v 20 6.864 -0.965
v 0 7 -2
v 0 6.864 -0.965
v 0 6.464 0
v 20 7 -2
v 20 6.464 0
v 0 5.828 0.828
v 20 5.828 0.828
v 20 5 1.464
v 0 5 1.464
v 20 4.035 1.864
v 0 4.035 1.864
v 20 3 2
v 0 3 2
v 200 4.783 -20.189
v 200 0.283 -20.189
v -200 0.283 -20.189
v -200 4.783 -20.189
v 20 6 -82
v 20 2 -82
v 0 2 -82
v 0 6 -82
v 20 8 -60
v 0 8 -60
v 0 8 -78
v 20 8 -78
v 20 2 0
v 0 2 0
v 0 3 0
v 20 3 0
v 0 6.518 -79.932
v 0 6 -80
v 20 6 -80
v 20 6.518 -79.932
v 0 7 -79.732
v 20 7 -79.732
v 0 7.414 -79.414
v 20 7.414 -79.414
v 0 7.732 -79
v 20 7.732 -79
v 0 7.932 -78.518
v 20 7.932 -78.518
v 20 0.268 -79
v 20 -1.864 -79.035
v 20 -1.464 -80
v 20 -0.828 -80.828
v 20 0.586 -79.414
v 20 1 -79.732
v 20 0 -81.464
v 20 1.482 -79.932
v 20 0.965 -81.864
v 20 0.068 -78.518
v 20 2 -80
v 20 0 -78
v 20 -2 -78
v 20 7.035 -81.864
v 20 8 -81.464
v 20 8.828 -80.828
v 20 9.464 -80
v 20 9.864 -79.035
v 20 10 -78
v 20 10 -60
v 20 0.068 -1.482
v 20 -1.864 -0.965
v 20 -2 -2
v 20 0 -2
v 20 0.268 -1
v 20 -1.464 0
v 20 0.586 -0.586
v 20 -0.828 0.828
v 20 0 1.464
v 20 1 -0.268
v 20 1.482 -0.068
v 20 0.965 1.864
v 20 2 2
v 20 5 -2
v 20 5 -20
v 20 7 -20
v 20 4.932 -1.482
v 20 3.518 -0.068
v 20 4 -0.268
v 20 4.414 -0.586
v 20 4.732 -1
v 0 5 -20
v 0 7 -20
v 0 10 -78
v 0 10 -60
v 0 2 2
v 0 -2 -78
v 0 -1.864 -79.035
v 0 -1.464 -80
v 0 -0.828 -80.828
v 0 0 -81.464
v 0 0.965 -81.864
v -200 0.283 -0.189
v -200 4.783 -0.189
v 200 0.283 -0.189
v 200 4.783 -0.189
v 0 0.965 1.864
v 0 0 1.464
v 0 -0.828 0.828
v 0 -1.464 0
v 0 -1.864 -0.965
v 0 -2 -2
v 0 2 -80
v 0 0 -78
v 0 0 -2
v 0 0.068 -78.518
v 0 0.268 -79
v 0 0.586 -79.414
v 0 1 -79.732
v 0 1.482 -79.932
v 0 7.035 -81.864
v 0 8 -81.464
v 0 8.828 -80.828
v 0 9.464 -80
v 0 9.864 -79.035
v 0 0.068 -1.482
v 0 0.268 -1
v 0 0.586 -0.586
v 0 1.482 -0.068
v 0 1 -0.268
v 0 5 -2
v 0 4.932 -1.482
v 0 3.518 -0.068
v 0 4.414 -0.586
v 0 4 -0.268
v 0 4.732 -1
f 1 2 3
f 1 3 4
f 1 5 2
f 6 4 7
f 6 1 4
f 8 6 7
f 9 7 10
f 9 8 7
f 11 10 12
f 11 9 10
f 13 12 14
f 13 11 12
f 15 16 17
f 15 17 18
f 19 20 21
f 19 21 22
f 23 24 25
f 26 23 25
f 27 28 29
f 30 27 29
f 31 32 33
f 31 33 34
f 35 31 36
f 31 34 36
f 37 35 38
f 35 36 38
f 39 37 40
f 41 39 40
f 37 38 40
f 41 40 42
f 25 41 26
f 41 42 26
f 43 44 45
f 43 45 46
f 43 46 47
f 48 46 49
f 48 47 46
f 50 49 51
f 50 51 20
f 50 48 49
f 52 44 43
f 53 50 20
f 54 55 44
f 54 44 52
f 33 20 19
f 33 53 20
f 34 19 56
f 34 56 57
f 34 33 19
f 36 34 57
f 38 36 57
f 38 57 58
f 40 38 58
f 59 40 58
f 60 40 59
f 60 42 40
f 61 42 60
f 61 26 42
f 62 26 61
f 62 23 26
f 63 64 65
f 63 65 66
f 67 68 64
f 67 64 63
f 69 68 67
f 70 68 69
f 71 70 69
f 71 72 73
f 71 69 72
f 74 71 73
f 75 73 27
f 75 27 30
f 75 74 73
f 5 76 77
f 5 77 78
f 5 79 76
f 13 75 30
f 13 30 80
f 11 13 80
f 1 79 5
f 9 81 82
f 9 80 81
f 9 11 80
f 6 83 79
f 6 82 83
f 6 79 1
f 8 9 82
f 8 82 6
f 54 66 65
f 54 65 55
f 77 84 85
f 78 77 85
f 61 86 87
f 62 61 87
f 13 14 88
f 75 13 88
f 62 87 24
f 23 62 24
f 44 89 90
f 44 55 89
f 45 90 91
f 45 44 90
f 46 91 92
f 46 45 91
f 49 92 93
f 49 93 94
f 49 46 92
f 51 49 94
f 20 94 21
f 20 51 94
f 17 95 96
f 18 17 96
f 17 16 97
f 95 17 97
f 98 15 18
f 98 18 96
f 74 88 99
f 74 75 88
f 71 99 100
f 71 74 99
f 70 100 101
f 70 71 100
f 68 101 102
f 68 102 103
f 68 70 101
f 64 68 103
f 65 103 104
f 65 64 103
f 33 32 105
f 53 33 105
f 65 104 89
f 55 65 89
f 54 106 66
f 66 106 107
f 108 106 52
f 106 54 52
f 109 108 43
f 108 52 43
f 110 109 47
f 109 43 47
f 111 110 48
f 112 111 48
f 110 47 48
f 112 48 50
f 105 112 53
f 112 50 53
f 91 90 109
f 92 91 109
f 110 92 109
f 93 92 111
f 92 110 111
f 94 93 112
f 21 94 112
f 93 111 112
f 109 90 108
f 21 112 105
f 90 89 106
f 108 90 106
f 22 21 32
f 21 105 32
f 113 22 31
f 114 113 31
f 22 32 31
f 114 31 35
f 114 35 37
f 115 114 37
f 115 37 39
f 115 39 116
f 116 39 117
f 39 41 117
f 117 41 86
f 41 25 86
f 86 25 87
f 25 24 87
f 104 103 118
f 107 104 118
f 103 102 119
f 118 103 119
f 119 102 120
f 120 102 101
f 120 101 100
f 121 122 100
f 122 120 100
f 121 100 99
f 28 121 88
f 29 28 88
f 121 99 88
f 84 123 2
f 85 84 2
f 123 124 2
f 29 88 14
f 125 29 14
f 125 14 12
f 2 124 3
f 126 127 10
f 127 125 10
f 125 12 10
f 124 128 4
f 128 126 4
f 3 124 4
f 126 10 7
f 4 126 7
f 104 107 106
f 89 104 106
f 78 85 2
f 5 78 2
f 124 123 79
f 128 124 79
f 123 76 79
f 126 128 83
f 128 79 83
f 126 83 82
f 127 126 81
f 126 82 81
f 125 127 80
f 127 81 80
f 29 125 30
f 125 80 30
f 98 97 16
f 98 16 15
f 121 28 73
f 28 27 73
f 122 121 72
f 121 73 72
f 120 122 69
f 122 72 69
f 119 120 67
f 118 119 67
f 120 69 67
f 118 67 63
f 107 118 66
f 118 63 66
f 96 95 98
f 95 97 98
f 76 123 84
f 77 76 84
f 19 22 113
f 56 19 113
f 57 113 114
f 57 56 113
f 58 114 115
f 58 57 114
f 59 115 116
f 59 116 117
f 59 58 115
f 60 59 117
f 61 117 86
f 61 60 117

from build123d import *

# Parameters (mm, degrees)
F1_DEPTH      = 20
F2_R          = 4
F3_R          = 2
F4_W          = 4.5
F4_H          = 20
F5_DEPTH      = 200
F5_DEPTH_BACK = 200


with BuildPart() as f1:
    # F0 (on Right) → F1 (new body)
    with BuildSketch(Plane.YZ):
        Polygon((0, -80), (0, 0), (5, 0), (5, -20), (7, -20), (7, 2), (-2, 2), (-2, -82), (10, -82), (10, -60), (8, -60), (8, -80), align=None)
    extrude(amount=F1_DEPTH)

    # F2
    f2_edges = [f1.edges().sort_by_distance(p)[0] for p in [
        (10, -2, 2),
        (10, 7, 2),
        (10, -2, -82),
        (10, 10, -82),
    ]]
    fillet(f2_edges, radius=F2_R)

    # F3
    f3_edges = [f1.edges().sort_by_distance(p)[0] for p in [
        (10, 8, -80),
        (10, 5, 0),
        (10, 0, 0),
        (10, 0, -80),
    ]]
    fillet(f3_edges, radius=F3_R)


with BuildPart() as f5:
    # F4 (on Right) → F5 (new body, two sides)
    with BuildSketch(Plane.YZ) as f5_sk:
        with Locations((2.533037, -10.188935)):
            Rectangle(F4_W, F4_H)
    extrude(amount=F5_DEPTH)
    extrude(f5_sk.sketch, amount=-F5_DEPTH_BACK)


solid = Compound([f1.part, f5.part])
